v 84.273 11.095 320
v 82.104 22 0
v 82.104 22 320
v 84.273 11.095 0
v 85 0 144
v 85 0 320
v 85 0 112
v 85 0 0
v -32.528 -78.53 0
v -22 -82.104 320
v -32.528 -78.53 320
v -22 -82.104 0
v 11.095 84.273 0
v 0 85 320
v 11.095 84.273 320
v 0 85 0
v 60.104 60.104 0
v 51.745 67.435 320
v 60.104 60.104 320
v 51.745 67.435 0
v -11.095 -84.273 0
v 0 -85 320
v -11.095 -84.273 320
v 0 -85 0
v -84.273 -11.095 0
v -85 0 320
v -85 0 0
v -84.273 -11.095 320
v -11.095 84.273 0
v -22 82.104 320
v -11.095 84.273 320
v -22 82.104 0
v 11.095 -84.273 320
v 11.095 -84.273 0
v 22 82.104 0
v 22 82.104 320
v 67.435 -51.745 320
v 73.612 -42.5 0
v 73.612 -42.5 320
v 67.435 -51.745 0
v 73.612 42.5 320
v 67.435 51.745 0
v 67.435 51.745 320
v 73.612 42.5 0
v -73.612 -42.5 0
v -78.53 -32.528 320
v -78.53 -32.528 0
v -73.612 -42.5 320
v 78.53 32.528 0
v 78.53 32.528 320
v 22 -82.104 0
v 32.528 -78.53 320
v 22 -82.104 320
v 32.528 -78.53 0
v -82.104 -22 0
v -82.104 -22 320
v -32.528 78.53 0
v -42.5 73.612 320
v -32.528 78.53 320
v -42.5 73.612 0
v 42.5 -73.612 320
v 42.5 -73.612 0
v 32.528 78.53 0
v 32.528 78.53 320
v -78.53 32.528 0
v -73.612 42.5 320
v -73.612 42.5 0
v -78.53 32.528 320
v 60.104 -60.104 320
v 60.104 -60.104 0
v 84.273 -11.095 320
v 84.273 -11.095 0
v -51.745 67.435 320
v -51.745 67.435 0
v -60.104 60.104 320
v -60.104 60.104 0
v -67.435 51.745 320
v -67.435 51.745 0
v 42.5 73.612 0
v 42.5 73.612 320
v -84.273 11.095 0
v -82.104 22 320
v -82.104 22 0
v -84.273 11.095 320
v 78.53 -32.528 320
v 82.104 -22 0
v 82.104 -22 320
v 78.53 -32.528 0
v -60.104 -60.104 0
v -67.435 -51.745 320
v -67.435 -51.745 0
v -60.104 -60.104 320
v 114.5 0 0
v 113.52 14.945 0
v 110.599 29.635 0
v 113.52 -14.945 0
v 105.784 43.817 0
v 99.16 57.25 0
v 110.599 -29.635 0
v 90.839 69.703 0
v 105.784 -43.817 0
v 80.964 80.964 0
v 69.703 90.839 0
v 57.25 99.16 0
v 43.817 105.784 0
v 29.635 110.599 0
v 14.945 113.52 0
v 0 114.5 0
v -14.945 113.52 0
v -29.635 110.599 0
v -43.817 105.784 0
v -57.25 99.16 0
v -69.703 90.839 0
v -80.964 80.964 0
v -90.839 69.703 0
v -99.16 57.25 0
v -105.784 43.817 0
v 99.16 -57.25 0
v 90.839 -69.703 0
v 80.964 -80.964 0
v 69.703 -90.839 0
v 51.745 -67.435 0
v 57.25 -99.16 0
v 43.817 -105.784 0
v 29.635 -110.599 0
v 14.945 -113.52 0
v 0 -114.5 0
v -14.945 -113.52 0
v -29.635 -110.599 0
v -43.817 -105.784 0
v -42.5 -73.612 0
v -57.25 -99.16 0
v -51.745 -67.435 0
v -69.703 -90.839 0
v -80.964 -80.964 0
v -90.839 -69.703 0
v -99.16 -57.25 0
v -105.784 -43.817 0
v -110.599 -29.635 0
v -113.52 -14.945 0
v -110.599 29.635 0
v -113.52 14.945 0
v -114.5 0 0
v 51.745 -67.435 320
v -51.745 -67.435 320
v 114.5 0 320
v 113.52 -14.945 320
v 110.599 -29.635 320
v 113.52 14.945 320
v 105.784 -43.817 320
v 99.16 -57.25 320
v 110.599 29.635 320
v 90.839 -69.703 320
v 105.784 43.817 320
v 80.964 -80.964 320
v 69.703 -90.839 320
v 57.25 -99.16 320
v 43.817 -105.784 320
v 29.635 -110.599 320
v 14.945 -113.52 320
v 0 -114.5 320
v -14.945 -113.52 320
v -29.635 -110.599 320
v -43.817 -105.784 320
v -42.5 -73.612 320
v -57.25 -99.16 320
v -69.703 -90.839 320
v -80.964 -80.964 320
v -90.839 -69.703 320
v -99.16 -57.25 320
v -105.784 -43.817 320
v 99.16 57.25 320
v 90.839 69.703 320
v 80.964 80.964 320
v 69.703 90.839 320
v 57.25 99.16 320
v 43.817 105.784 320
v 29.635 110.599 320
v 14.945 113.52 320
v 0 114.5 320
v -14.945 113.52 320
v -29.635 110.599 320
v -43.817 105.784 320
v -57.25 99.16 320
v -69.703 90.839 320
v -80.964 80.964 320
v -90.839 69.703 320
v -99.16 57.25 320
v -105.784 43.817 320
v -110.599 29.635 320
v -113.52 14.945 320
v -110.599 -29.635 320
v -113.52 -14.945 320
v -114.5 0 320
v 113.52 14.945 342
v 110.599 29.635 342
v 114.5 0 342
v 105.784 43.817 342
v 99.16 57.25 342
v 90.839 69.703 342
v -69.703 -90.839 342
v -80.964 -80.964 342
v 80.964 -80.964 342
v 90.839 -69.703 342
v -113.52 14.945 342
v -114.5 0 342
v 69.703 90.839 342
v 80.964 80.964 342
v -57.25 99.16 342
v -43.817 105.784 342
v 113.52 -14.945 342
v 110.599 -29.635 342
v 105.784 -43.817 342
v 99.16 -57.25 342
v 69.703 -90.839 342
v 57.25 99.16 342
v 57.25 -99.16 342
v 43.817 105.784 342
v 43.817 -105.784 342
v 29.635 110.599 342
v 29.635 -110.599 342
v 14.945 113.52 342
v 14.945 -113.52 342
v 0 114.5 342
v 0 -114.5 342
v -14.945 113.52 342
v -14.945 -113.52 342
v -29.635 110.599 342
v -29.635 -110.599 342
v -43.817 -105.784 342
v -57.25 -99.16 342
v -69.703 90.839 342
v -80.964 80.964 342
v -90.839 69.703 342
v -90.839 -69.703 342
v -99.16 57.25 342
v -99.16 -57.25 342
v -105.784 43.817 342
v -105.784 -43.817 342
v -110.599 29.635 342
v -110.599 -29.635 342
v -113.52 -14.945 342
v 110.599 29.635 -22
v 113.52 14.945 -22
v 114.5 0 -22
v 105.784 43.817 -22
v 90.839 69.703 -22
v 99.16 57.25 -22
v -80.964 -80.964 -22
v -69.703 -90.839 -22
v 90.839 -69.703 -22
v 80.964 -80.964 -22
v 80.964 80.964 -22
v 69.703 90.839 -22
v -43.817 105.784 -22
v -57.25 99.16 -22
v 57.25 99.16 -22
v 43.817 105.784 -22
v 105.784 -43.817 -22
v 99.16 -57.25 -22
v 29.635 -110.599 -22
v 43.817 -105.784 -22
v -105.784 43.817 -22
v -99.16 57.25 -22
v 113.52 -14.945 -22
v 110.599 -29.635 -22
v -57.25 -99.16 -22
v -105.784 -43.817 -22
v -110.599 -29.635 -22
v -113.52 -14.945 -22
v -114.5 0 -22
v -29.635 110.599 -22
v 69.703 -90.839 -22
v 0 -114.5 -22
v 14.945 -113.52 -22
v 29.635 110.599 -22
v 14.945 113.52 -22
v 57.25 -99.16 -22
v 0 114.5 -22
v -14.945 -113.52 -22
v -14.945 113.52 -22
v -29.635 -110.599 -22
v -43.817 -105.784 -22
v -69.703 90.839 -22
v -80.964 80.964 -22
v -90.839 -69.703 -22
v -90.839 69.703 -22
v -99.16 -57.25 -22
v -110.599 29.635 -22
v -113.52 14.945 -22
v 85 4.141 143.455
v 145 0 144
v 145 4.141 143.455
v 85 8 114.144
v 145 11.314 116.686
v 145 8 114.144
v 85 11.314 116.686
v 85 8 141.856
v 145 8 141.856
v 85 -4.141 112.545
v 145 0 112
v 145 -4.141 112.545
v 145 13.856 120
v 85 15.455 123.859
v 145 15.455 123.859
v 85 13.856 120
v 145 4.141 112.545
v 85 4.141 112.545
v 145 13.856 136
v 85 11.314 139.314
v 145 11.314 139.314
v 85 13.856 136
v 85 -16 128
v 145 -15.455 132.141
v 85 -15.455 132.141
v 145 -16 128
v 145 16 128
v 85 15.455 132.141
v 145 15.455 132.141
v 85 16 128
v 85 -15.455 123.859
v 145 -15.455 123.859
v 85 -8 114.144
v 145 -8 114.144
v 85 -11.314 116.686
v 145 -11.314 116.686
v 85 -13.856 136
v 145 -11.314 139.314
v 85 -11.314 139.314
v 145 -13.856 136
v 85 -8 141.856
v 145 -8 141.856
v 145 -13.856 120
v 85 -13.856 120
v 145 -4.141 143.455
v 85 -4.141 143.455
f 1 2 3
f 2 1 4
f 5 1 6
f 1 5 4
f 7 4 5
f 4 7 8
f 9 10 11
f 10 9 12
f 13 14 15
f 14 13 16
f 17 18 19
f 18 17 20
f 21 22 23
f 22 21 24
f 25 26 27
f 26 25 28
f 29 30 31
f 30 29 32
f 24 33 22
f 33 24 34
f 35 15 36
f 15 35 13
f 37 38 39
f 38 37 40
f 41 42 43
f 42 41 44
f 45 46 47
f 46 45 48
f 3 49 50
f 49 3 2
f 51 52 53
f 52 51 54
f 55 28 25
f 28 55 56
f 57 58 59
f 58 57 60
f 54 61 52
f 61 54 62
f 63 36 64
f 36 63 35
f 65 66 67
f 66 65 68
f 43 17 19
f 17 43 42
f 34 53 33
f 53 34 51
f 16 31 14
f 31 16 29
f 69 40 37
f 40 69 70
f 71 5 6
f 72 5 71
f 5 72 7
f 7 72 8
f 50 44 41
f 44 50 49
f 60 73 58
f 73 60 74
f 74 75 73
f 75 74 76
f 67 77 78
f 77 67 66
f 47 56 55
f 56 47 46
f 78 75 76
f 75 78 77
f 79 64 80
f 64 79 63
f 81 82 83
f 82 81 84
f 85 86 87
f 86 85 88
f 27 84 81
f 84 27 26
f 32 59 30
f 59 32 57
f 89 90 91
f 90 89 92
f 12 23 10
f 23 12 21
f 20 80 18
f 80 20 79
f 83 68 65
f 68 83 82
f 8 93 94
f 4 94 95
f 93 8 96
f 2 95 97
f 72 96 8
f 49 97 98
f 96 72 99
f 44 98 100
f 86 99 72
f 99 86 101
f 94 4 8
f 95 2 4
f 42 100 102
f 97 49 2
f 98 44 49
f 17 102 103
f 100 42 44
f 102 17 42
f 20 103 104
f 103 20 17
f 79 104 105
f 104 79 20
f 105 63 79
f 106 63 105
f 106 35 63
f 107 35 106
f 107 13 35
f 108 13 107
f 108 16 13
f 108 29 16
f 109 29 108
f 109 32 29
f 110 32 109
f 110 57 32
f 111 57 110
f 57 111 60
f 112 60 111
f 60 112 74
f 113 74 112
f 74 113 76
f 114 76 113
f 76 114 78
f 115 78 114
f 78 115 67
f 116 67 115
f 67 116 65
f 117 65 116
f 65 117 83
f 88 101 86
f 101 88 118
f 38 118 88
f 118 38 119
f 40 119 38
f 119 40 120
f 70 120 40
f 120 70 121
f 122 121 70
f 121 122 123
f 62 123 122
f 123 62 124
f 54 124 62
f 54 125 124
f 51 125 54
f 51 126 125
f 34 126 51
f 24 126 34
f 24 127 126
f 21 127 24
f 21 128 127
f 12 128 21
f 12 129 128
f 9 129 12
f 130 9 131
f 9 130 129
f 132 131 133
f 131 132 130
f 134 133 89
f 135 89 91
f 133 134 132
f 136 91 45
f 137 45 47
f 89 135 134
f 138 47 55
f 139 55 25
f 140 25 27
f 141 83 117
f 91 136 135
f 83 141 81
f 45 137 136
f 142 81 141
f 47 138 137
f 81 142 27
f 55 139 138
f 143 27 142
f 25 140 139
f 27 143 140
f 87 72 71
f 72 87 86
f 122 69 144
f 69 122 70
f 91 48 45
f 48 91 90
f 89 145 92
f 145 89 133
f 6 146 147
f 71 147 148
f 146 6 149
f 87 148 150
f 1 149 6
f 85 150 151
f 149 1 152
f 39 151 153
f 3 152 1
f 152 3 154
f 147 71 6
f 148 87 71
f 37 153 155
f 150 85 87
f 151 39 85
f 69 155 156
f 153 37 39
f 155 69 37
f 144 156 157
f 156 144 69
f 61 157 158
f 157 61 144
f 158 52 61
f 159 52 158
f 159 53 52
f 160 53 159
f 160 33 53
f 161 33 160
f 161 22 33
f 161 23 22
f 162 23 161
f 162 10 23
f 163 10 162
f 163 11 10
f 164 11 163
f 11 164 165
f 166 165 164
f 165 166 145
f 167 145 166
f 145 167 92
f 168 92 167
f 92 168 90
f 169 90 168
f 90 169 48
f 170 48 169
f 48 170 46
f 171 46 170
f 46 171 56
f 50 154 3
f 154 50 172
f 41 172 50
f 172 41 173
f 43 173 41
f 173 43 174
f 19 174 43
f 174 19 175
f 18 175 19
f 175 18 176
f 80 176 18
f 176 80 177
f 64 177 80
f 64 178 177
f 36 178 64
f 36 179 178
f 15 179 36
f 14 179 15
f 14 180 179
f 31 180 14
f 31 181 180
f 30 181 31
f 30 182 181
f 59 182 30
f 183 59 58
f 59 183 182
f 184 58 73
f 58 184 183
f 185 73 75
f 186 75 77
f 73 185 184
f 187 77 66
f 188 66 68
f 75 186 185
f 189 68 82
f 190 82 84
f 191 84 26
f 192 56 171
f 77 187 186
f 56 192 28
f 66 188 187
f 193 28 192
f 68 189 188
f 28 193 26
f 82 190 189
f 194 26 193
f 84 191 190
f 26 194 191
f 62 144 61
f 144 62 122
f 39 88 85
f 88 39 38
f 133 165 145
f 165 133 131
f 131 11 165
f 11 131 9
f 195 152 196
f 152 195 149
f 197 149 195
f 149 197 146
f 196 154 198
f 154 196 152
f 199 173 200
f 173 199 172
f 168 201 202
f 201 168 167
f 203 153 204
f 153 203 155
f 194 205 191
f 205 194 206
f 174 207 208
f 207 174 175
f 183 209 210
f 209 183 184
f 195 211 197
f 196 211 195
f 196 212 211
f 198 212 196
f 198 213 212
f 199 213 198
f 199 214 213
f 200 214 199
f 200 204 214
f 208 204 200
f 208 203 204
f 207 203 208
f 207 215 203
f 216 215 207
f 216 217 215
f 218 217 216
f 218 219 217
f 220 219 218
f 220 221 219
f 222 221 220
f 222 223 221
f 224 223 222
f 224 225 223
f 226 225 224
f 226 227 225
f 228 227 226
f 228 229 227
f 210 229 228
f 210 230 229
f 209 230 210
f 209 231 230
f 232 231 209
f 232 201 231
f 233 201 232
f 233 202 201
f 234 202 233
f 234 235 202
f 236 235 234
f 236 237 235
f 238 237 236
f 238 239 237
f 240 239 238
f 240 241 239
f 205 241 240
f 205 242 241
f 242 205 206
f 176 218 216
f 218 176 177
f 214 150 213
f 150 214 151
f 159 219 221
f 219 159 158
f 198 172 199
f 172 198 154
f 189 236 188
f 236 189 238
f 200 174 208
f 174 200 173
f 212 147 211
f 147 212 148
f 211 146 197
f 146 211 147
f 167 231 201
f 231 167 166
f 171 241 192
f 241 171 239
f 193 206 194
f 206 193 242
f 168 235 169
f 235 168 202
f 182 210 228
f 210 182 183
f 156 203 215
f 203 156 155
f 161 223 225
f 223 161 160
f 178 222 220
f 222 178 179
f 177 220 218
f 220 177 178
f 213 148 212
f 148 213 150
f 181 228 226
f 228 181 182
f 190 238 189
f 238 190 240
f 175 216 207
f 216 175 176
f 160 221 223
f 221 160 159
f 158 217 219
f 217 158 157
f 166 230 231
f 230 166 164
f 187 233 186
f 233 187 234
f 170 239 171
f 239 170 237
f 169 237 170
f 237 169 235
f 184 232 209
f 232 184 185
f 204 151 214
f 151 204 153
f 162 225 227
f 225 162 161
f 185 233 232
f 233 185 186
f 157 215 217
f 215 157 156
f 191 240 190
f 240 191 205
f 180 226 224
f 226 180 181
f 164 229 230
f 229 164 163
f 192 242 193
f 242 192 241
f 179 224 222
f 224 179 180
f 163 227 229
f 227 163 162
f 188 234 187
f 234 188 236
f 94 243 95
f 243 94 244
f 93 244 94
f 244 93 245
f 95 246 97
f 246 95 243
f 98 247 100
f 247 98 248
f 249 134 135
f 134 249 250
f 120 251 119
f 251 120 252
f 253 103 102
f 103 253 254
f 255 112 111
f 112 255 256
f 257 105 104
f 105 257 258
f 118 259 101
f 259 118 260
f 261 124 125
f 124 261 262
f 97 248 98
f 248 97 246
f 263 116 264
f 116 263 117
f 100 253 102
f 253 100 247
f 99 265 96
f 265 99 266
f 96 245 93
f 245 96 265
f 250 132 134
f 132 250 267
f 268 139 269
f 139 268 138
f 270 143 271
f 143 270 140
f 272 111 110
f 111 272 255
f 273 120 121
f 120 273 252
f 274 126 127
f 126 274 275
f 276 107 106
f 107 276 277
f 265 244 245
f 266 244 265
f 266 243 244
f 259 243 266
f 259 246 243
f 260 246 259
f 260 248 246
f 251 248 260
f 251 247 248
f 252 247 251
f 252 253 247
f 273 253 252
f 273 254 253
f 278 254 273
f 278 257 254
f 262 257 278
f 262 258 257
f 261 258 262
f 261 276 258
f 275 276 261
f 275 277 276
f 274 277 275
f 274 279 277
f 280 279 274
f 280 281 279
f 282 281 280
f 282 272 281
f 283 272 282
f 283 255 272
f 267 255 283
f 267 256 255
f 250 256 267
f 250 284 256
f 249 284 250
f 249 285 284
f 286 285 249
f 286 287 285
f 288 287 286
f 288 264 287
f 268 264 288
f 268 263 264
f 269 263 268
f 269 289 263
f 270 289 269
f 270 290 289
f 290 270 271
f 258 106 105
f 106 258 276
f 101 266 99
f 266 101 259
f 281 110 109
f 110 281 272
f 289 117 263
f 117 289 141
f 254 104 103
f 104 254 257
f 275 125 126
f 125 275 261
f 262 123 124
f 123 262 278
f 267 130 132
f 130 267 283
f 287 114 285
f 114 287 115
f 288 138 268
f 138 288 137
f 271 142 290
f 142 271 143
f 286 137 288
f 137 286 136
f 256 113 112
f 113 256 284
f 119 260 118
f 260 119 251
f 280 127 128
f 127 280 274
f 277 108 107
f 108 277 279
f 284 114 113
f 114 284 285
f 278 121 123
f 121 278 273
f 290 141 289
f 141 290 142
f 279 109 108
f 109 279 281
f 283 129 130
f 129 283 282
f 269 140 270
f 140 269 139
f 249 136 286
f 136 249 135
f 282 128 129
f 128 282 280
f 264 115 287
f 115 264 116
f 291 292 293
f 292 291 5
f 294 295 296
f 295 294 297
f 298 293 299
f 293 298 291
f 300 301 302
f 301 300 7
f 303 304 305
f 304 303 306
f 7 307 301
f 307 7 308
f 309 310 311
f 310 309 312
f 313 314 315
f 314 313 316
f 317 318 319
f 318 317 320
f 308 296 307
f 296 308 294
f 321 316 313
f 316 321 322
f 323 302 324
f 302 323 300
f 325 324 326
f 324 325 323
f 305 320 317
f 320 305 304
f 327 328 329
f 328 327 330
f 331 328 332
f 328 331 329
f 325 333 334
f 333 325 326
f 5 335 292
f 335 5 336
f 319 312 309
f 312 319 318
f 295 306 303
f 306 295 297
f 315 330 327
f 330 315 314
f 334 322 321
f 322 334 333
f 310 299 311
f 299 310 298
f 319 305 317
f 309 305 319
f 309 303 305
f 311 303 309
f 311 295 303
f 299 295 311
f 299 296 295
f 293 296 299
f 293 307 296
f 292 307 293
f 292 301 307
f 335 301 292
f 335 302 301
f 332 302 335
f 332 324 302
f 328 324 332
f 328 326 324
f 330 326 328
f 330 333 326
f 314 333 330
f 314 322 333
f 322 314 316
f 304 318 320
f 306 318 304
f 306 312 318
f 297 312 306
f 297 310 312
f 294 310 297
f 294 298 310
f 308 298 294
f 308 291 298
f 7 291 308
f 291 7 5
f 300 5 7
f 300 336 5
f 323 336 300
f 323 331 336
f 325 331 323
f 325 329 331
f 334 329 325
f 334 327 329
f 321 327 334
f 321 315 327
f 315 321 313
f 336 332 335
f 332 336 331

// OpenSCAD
// Alarm check (wet-pipe) valve, 4" flanged.
body_d = 170;
body_h = 320;
flange_od = 229;
flange_t = 22;
union() {
    cylinder(h = body_h, d = body_d, $fn = 48);
    translate([0, 0, body_h])
        cylinder(h = flange_t, d = flange_od, $fn = 48);
    translate([0, 0, -flange_t])
        cylinder(h = flange_t, d = flange_od, $fn = 48);
    // Trim port (side)
    translate([body_d / 2, 0, body_h * 0.4])
        rotate([0, 90, 0])
            cylinder(h = 60, d = 32, $fn = 24);
}
